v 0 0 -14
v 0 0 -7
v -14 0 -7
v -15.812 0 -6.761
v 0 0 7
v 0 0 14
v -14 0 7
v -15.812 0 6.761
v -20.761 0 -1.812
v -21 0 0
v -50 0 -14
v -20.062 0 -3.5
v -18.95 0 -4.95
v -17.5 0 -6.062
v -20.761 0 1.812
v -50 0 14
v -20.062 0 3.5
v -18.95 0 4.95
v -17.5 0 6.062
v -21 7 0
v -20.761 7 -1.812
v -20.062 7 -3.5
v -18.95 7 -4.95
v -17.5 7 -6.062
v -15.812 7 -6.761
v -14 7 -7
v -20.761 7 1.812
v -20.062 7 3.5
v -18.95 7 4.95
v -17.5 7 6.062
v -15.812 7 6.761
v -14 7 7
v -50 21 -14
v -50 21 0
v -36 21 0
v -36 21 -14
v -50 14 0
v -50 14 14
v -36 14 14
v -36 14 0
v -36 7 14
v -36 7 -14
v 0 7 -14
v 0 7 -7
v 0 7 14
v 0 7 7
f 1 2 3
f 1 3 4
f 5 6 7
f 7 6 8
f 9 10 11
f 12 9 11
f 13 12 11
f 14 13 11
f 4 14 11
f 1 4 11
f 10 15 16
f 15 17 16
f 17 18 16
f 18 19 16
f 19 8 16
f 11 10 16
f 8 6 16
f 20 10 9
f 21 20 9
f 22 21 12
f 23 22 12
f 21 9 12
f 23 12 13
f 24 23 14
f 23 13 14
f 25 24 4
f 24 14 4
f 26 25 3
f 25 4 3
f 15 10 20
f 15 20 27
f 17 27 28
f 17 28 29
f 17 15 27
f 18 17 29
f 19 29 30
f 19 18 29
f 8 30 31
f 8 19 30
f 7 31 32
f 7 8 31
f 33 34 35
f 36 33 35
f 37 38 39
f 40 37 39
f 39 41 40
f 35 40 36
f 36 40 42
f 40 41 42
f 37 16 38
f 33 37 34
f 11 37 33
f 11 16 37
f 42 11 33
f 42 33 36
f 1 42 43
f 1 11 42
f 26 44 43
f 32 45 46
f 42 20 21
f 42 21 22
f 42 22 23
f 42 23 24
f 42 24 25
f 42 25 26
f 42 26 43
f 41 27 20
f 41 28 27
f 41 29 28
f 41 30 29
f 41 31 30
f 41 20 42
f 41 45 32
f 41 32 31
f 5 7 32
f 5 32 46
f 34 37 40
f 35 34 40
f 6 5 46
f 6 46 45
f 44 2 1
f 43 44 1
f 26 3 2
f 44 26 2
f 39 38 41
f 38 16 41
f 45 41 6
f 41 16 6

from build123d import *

# Parameters (mm, degrees)
BOSS_EXTRUDE1_DEPTH = 7
SKETCH2_W           = 14
SKETCH2_H           = 14
BOSS_EXTRUDE2_DEPTH = 7
SKETCH2_3_W         = 14
SKETCH2_3_H         = 14
BOSS_EXTRUDE3_DEPTH = 14


with BuildPart() as part:
    # Sketch1 → Boss-Extrude1 (new body)
    with BuildSketch(Plane(origin=(0, 0, 0), x_dir=(1, 0, 0), z_dir=(0, 1, 0))):
        with BuildLine():
            Line((0, -7), (0, -14))
            Line((0, -14), (-50, -14))
            Line((-50, -14), (-50, 0))
            Line((-50, 0), (-21, 0))
            ThreePointArc((-21, 0), (-18.949747468, -4.949747468), (-14, -7))
            Line((-14, -7), (0, -7))
        make_face()
    extrude(amount=BOSS_EXTRUDE1_DEPTH)

    # Mirror1: part across plane


with BuildPart() as part_1:
    add(part.part)
    add(part.part.mirror(Plane(origin=(-21, 7, 0), x_dir=(1, 0, 0), z_dir=(0, 0, 1))))

    # Sketch2 → Boss-Extrude2 (add)
    with BuildSketch(Plane(origin=(0, 7, 0), x_dir=(1, 0, 0), z_dir=(0, 1, 0))):
        with Locations((-43, -7)):
            Rectangle(SKETCH2_W, SKETCH2_H)
    extrude(amount=BOSS_EXTRUDE2_DEPTH)

    # Sketch2<3> → Boss-Extrude3 (add)
    with BuildSketch(Plane(origin=(0, 7, 0), x_dir=(1, 0, 0), z_dir=(0, 1, 0))):
        with Locations((-43, 7)):
            Rectangle(SKETCH2_3_W, SKETCH2_3_H)
    extrude(amount=BOSS_EXTRUDE3_DEPTH)


solid = part_1.part
